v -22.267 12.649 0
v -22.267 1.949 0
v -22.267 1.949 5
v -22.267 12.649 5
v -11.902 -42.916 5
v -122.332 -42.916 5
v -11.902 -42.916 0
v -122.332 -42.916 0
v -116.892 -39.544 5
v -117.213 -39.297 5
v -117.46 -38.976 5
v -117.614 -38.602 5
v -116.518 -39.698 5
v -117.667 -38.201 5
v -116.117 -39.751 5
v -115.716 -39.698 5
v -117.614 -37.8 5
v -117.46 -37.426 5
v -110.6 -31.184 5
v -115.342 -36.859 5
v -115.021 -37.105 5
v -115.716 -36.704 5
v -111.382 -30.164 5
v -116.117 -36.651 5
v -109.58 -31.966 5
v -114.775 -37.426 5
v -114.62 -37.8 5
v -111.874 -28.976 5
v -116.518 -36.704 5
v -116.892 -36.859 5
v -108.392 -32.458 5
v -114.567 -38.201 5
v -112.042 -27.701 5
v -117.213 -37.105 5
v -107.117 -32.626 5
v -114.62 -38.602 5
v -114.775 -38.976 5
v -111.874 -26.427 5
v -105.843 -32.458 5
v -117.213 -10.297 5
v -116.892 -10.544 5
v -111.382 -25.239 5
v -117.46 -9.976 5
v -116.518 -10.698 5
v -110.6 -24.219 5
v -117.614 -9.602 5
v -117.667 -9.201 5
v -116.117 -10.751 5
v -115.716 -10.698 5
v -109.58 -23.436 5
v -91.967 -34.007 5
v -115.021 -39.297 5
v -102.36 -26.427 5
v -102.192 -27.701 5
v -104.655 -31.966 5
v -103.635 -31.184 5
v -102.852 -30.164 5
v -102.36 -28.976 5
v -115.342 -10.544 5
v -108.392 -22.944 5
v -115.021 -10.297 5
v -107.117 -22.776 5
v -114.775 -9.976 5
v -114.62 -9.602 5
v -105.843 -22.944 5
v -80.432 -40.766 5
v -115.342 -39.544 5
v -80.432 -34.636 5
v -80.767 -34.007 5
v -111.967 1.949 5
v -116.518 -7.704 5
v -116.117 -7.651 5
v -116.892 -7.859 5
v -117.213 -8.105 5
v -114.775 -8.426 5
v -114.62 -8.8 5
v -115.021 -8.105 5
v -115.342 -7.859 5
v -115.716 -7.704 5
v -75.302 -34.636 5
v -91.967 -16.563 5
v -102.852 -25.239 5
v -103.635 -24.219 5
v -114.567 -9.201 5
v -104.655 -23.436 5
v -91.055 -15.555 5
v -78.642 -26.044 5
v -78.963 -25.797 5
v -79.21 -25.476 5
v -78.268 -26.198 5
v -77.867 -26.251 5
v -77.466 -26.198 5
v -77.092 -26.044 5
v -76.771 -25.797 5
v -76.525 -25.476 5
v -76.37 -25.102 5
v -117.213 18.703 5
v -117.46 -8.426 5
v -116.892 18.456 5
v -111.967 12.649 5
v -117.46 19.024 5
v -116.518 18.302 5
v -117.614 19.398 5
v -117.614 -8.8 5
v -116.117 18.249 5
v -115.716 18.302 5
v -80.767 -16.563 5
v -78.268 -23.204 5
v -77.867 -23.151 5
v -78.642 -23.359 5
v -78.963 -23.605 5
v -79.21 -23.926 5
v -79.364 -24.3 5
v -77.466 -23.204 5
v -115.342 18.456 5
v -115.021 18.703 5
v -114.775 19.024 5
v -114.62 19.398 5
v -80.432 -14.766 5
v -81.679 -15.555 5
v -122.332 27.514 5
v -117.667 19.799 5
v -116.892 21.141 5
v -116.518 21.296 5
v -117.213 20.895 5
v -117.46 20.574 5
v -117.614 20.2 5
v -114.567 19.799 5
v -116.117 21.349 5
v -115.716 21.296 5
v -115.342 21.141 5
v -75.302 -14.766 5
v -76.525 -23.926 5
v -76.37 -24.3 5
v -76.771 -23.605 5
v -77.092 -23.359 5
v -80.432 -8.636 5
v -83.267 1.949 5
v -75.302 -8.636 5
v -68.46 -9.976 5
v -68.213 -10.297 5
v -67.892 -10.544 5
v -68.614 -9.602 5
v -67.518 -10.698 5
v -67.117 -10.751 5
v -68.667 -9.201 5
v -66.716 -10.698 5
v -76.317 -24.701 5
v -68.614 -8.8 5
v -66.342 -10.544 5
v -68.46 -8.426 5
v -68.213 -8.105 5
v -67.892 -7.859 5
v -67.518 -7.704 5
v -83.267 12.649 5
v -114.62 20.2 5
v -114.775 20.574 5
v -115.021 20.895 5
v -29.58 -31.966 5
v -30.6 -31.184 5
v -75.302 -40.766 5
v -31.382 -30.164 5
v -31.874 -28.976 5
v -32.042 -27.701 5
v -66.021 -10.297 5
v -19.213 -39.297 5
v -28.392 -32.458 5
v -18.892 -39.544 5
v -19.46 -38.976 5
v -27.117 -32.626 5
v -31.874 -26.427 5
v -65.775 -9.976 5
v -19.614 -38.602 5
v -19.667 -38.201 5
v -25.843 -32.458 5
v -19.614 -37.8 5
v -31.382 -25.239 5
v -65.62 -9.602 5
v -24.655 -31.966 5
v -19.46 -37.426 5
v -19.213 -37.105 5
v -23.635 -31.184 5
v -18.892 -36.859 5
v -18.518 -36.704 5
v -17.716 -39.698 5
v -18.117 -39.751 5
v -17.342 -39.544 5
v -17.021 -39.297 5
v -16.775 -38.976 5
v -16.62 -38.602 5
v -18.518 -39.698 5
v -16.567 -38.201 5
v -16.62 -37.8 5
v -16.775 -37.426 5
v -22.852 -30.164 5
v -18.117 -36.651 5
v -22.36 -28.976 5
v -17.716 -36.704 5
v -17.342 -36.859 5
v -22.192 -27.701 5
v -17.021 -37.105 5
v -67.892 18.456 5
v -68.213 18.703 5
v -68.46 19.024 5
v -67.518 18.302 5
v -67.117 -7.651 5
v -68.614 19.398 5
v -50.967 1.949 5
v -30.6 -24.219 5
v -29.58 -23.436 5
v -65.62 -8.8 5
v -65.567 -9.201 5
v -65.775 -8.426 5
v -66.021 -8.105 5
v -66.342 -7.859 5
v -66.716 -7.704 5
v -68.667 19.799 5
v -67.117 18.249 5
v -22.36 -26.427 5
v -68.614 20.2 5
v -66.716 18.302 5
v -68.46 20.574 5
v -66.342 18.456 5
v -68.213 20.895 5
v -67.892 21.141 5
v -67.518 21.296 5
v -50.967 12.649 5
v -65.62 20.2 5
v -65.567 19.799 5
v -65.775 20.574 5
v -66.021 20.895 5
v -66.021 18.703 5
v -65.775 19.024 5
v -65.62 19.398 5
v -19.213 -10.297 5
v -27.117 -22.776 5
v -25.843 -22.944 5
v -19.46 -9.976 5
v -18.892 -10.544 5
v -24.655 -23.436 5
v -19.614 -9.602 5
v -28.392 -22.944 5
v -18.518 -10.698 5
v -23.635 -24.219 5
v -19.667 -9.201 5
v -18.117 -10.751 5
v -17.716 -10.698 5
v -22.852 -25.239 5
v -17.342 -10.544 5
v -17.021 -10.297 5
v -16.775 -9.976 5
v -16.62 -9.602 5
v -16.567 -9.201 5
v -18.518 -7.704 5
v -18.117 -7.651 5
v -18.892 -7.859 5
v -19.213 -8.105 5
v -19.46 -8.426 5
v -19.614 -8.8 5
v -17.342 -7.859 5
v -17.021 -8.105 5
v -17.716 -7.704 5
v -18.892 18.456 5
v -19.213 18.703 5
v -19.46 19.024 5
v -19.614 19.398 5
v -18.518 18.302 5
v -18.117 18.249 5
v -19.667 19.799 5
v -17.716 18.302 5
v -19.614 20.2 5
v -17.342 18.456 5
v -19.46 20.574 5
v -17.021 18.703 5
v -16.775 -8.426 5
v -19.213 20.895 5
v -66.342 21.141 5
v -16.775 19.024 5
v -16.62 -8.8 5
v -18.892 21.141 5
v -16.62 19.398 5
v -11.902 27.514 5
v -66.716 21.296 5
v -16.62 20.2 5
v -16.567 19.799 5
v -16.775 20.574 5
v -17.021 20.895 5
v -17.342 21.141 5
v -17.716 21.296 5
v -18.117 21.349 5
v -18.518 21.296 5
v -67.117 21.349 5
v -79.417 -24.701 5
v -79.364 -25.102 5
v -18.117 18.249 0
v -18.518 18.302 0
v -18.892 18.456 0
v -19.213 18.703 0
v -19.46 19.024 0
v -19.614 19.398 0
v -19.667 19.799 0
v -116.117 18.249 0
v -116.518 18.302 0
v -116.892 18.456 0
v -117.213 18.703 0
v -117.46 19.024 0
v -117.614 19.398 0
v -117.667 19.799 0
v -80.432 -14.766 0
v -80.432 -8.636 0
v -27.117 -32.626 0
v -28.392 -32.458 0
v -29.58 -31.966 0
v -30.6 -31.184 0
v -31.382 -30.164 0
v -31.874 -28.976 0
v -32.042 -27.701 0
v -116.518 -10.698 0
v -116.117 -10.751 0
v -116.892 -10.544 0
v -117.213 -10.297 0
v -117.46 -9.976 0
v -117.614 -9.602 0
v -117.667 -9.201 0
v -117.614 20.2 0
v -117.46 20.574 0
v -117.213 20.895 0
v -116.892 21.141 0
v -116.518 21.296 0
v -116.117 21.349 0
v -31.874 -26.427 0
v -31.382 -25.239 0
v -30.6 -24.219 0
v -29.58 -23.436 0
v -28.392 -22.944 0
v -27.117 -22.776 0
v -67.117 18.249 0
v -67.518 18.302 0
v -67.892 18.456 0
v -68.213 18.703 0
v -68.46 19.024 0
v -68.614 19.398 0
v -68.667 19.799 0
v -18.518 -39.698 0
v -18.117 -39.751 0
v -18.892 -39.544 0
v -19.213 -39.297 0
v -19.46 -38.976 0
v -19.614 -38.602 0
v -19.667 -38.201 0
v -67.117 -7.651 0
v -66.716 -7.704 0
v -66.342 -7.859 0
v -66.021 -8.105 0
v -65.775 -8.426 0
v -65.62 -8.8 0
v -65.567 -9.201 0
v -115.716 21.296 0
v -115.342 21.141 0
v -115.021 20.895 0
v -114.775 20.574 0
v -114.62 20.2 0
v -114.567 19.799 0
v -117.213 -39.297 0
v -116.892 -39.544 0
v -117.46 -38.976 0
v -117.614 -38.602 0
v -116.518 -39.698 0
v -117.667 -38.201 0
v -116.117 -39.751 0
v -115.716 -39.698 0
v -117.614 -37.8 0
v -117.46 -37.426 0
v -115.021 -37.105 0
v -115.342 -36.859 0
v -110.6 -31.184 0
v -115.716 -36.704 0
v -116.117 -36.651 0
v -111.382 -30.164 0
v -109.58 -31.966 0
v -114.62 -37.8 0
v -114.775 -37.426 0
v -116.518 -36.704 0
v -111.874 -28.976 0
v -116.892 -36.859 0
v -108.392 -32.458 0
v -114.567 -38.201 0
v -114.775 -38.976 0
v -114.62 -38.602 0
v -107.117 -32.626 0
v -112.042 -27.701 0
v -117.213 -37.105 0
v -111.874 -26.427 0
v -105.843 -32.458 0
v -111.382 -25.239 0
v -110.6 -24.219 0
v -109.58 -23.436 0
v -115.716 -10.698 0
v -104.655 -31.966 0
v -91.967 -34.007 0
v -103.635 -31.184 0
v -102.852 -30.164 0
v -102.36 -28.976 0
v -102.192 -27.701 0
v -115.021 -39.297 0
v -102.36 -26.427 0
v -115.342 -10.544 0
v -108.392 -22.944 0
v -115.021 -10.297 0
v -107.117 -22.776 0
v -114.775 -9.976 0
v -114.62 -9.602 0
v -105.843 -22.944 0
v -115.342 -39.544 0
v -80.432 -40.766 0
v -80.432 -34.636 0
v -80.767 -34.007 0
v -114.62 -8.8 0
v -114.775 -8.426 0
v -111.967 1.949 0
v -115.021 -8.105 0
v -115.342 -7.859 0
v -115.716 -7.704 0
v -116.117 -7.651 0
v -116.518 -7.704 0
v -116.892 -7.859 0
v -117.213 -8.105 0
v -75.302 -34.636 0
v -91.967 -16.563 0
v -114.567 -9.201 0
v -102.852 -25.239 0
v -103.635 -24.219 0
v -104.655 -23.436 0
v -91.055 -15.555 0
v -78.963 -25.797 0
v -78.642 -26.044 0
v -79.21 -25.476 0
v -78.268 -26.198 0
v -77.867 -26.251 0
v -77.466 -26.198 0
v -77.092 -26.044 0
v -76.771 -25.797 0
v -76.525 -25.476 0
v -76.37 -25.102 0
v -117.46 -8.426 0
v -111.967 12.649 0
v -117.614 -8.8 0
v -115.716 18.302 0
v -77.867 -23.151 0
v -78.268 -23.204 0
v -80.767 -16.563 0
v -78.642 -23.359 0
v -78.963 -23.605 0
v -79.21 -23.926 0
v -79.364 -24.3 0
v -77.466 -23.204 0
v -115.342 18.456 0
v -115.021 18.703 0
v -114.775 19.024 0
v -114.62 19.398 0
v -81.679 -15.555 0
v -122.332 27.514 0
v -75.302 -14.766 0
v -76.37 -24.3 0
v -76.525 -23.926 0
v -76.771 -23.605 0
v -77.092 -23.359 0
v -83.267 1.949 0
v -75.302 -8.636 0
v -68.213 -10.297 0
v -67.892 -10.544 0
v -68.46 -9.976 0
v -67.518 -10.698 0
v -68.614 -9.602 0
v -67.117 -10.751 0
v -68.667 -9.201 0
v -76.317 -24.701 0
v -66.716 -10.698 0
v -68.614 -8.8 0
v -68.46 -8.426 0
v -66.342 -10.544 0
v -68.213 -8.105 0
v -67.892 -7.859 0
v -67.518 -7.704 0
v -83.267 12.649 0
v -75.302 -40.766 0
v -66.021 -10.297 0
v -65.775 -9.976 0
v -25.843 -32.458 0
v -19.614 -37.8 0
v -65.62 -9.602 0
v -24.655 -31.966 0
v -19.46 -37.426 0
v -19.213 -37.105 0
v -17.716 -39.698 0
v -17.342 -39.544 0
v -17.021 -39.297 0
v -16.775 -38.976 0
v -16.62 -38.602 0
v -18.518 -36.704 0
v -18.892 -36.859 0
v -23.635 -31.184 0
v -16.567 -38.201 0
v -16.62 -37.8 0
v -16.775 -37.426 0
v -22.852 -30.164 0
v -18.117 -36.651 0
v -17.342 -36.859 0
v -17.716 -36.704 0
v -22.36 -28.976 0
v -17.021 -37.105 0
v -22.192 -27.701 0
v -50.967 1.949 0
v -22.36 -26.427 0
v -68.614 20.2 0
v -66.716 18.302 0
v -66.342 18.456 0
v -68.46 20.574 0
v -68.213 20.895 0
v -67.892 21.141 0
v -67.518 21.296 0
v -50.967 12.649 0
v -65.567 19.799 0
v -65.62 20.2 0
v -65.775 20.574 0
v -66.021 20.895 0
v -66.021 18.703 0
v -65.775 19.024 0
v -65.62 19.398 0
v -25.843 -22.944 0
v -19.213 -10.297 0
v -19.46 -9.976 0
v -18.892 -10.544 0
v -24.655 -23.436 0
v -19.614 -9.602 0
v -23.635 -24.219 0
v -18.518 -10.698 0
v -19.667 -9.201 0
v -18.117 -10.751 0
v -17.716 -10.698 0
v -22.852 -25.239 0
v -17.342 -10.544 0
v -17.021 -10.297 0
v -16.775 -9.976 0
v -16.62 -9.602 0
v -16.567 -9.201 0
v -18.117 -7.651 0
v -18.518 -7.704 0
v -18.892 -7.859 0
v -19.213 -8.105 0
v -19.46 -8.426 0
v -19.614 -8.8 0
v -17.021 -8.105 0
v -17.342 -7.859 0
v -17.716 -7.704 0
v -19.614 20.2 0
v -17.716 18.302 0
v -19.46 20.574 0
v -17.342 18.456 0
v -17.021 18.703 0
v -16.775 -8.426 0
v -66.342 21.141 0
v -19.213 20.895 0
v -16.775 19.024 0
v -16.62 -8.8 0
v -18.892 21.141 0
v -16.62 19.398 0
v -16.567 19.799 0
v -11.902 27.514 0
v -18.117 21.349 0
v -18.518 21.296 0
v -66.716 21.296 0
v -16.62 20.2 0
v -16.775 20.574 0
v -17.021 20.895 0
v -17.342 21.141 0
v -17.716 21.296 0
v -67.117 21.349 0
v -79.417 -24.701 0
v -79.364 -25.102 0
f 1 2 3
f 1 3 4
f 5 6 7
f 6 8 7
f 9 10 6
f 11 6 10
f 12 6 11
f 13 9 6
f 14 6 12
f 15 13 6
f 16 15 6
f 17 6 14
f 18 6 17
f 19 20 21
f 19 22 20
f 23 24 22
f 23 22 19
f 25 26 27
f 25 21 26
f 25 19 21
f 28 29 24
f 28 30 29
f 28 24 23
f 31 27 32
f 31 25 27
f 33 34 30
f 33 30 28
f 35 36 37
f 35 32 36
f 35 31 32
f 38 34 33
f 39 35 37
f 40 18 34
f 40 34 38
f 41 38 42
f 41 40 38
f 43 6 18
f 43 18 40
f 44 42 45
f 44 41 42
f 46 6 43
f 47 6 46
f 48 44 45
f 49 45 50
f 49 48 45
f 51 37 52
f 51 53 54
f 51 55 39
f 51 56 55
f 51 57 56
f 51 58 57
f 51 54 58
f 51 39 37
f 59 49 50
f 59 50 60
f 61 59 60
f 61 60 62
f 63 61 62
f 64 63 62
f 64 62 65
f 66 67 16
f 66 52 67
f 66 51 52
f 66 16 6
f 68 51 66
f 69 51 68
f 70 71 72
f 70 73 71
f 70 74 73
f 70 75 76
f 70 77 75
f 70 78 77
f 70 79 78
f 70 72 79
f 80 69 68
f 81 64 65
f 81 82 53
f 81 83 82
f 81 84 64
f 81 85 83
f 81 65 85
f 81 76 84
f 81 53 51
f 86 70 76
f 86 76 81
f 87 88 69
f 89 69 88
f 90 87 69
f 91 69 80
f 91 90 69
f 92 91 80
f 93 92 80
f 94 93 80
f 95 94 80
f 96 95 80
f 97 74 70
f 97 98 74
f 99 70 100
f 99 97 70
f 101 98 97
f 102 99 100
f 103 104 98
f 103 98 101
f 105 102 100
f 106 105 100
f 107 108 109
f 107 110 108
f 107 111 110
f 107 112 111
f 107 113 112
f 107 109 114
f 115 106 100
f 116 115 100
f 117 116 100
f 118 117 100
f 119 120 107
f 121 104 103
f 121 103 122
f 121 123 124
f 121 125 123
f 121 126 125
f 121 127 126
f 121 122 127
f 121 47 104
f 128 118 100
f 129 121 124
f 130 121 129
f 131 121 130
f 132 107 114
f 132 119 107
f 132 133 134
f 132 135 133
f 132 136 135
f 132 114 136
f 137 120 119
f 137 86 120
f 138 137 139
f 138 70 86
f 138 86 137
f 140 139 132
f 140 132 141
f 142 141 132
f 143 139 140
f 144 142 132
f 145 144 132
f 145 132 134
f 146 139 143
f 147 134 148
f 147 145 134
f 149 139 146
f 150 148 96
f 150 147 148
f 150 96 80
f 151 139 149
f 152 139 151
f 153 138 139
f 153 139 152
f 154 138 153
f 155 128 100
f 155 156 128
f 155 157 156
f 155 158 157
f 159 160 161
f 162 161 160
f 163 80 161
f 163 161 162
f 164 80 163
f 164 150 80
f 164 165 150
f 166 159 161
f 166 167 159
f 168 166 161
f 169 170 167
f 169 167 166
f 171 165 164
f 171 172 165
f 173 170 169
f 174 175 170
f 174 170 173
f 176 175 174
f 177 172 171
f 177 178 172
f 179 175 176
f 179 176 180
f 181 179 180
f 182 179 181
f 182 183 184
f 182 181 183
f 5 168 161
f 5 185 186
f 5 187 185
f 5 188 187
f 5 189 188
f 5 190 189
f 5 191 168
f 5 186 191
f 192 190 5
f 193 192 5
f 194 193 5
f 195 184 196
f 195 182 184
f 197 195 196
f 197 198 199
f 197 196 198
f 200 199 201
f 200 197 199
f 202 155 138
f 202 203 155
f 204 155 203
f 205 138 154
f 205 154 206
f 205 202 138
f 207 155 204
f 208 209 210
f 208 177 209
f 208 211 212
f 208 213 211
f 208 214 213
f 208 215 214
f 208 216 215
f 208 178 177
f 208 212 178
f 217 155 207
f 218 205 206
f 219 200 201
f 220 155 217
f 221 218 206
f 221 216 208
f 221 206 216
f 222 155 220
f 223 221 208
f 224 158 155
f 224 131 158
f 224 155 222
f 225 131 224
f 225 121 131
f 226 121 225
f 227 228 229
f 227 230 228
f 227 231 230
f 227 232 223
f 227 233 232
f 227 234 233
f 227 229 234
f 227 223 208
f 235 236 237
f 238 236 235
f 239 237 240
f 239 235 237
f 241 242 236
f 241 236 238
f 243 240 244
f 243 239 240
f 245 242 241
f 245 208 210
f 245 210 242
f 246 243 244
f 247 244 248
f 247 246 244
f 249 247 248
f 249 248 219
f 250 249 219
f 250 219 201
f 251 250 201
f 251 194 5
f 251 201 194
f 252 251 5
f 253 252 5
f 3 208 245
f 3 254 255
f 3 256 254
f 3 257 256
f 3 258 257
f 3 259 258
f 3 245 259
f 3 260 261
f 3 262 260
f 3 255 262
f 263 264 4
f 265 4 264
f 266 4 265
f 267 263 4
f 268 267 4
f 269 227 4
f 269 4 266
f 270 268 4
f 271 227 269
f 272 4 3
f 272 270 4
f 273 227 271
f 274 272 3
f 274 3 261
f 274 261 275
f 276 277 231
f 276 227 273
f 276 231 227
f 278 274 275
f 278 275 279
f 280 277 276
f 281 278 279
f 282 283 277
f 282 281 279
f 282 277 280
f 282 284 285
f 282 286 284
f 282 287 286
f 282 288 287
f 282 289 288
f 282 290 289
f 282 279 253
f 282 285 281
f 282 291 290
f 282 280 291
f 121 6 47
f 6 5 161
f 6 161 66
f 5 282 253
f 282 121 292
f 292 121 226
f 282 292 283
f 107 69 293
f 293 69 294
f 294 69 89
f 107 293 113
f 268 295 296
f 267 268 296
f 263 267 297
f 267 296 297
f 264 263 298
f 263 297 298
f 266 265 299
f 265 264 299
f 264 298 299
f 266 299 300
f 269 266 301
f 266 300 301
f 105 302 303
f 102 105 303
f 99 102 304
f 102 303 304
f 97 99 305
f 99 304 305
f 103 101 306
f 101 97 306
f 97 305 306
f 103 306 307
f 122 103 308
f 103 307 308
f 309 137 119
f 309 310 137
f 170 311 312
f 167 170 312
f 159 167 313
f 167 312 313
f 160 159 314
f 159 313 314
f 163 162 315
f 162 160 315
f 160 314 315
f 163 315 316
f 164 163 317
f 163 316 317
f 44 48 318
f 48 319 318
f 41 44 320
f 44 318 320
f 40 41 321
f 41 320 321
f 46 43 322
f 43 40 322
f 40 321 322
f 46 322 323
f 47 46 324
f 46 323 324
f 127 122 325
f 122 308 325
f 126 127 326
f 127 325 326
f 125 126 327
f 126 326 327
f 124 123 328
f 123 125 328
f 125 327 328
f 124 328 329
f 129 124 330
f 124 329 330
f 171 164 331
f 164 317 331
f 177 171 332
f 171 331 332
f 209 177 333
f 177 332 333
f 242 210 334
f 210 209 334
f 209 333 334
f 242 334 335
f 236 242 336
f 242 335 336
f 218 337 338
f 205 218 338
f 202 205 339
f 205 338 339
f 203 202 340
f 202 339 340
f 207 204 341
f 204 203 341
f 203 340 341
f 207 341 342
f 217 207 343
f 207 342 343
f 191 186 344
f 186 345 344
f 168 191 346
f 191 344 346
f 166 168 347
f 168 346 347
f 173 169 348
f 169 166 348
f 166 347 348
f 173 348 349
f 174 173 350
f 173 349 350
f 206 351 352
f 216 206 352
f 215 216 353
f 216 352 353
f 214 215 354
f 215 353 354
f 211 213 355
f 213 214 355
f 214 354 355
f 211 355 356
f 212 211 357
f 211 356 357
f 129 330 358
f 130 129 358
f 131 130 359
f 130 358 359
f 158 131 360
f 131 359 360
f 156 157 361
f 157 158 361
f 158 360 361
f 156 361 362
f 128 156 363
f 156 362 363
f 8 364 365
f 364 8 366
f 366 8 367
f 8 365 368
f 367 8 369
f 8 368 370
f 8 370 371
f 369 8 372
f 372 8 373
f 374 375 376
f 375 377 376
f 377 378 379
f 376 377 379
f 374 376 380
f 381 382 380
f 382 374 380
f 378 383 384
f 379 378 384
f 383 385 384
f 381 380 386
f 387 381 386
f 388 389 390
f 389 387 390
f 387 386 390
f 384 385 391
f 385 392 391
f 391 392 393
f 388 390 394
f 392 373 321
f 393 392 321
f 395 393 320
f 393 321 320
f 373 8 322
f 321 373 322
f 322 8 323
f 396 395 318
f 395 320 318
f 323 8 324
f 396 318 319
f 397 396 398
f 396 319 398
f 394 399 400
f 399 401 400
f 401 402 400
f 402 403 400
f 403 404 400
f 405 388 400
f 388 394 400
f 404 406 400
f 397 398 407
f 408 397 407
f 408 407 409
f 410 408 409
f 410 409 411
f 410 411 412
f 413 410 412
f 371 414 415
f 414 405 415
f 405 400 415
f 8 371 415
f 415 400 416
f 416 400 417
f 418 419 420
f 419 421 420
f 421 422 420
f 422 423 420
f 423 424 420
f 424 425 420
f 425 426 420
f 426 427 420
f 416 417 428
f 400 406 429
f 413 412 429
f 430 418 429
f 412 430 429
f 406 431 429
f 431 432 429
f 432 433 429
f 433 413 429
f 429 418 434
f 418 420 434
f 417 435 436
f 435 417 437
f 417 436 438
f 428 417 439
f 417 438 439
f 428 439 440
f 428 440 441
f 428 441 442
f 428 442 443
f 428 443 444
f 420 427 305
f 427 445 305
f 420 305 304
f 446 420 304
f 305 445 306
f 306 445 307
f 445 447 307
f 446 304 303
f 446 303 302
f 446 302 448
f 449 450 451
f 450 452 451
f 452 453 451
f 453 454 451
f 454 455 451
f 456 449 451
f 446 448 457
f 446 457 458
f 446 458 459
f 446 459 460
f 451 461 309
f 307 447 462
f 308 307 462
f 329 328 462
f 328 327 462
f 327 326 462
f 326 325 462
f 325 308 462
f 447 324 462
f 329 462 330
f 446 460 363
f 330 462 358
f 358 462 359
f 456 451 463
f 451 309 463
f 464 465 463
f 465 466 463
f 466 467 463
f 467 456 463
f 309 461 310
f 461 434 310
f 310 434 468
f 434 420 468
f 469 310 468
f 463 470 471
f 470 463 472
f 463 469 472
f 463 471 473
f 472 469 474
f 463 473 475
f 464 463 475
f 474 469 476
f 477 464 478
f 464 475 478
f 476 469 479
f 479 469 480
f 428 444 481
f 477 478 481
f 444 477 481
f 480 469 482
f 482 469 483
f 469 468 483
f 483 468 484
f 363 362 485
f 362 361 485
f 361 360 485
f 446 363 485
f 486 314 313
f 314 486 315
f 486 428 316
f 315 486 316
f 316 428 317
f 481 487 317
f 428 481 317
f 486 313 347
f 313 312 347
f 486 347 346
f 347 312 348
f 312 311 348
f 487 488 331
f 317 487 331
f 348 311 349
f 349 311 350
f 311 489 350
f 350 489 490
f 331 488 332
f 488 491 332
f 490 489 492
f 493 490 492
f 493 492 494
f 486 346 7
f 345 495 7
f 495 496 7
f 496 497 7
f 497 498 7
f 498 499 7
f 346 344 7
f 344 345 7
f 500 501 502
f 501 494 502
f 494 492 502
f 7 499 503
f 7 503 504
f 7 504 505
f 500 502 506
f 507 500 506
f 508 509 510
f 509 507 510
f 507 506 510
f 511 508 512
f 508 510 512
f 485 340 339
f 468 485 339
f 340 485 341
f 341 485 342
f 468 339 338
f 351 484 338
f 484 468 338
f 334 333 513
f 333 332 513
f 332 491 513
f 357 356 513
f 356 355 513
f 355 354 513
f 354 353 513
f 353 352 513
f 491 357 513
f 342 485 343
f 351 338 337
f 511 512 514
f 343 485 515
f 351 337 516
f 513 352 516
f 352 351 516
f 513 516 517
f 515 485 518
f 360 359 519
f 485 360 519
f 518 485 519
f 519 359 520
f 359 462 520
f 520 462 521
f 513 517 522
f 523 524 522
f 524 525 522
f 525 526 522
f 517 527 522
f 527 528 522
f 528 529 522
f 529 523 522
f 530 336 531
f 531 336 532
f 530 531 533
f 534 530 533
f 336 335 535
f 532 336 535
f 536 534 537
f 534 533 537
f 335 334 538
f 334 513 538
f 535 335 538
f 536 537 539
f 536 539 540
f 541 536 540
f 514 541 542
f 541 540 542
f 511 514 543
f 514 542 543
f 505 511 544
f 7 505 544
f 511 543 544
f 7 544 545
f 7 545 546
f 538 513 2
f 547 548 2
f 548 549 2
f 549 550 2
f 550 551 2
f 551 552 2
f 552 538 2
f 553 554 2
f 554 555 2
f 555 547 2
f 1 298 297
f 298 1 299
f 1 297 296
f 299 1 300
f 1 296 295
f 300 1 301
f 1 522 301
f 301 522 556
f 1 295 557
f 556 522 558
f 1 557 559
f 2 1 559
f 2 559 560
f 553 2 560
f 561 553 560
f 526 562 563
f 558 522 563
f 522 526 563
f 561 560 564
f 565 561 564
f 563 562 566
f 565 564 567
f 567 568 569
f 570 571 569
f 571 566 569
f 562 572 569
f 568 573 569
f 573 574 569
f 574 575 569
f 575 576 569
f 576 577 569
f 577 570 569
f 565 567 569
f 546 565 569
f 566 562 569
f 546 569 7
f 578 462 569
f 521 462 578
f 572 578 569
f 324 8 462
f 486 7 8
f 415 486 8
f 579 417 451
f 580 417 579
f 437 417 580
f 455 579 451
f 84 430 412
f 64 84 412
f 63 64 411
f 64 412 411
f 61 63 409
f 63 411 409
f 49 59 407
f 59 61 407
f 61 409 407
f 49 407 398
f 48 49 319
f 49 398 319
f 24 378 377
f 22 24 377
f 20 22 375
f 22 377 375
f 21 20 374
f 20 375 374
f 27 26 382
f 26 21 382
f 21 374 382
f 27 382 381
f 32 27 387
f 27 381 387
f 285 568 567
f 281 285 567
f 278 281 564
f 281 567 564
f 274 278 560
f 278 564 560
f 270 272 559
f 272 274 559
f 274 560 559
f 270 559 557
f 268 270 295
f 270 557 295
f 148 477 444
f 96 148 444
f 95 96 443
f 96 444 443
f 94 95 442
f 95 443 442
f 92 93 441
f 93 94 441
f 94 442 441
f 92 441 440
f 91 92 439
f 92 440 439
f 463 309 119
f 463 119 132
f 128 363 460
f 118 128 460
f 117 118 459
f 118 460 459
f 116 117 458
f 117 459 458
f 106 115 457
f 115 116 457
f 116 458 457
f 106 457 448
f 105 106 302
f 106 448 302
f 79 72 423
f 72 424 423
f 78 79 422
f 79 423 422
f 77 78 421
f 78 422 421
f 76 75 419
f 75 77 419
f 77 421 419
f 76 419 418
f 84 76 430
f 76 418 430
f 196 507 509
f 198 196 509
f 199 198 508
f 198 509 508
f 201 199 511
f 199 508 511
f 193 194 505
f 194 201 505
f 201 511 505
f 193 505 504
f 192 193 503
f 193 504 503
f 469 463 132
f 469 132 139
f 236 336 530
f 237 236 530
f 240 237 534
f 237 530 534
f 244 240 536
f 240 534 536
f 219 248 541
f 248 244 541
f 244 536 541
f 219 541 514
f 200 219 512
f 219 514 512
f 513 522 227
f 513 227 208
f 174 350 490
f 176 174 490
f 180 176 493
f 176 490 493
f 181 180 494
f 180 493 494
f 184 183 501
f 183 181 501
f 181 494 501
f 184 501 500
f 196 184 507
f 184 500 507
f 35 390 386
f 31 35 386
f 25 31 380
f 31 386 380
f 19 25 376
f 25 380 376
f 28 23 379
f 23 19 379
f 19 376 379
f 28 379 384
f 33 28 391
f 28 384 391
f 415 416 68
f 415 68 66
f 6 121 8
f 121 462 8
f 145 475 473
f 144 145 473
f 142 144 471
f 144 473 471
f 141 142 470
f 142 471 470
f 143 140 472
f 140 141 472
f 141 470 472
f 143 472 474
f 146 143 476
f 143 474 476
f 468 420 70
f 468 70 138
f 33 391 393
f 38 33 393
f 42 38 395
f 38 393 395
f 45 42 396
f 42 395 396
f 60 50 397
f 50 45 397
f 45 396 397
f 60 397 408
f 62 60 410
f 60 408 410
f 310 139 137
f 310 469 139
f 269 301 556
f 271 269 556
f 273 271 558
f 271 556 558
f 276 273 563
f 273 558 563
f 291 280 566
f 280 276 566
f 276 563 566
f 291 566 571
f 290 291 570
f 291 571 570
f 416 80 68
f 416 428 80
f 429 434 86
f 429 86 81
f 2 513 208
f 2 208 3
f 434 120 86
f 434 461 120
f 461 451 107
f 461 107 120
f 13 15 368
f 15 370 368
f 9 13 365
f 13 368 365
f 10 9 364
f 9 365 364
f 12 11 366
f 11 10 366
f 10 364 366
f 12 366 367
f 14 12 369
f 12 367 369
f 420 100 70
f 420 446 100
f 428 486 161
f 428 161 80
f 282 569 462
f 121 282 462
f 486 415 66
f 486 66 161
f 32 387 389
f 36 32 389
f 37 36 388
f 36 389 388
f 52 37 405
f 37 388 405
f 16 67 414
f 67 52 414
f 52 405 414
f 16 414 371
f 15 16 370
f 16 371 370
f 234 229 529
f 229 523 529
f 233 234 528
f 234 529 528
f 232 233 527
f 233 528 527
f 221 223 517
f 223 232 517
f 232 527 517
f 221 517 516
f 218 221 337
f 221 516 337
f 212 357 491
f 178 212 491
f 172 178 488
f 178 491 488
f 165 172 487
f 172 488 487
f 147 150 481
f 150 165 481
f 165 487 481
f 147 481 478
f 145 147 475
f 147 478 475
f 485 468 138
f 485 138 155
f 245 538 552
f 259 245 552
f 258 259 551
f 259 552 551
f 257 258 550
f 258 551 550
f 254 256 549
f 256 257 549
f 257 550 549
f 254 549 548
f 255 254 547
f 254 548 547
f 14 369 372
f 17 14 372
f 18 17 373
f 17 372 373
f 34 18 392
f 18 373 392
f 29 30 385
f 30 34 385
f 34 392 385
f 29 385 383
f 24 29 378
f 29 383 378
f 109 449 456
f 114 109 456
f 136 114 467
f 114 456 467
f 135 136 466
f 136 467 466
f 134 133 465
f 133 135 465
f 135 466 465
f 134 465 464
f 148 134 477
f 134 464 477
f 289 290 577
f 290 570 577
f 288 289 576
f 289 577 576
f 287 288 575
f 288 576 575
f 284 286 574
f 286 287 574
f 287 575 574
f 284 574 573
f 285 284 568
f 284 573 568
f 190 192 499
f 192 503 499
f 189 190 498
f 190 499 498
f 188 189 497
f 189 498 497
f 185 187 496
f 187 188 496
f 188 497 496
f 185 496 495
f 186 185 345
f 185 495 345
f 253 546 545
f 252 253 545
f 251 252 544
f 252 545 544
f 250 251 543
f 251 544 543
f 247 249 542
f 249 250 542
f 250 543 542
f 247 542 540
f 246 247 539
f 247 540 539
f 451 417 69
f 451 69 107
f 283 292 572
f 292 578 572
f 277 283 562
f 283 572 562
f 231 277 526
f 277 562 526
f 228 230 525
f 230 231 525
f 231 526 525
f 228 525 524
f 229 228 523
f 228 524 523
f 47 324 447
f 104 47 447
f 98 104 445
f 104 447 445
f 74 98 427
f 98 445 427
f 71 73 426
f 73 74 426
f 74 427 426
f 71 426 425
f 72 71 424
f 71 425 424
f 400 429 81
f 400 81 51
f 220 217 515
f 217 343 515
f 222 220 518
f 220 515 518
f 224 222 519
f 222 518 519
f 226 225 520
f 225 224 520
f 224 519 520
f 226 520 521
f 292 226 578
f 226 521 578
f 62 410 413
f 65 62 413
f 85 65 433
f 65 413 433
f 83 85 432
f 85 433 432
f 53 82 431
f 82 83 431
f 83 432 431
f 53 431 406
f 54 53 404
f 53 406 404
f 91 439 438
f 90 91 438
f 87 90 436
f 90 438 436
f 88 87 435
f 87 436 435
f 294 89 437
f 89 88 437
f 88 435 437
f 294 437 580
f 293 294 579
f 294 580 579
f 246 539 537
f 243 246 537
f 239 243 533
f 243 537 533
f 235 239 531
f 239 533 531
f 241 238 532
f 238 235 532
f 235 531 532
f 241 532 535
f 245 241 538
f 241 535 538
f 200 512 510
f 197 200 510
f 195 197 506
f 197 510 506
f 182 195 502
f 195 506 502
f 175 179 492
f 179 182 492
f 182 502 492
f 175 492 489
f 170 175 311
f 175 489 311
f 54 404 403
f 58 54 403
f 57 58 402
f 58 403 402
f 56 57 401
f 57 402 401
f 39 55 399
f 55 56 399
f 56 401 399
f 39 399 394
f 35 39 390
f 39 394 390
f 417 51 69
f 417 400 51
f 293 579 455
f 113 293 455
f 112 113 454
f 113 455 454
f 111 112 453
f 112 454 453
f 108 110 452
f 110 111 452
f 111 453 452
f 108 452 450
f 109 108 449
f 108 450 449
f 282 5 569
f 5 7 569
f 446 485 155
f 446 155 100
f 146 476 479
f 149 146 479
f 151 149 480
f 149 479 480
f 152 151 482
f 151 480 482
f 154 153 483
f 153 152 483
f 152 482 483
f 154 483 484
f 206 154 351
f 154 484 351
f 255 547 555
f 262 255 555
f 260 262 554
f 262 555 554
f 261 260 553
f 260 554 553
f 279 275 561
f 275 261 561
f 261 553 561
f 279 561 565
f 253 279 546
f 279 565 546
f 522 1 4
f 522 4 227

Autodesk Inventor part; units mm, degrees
ref_plane "YZ Plane" through (0, 0, 0) normal (1, 0, 0) x (0, 1, 0)
ref_plane "XZ Plane" through (0, 0, 0) normal (0, 1, 0) x (-1, 0, 0)
ref_plane "XY Plane" through (0, 0, 0) normal (0, 0, 1) x (1, 0, 0)
sketch "Boceto1" plane through (0, 0, 0) normal (0, 0, 1) x (1, 0, 0)
  arc A0 (-116.1173, 21.3488) -> (-117.6673, 19.7988) centre (-116.1173, 19.7988) ccw
  arc A1 (-117.6673, 19.7988) -> (-116.1173, 18.2488) centre (-116.1173, 19.7988) ccw
  arc A2 (-116.1173, 18.2488) -> (-114.5673, 19.7988) centre (-116.1173, 19.7988) ccw
  arc A3 (-114.5673, 19.7988) -> (-116.1173, 21.3488) centre (-116.1173, 19.7988) ccw
  arc A4 (-67.1173, 21.3488) -> (-68.6673, 19.7988) centre (-67.1173, 19.7988) ccw
  arc A5 (-68.6673, 19.7988) -> (-67.1173, 18.2488) centre (-67.1173, 19.7988) ccw
  arc A6 (-67.1173, 18.2488) -> (-65.5673, 19.7988) centre (-67.1173, 19.7988) ccw
  arc A7 (-65.5673, 19.7988) -> (-67.1173, 21.3488) centre (-67.1173, 19.7988) ccw
  arc A8 (-18.1173, 21.3488) -> (-19.6673, 19.7988) centre (-18.1173, 19.7988) ccw
  arc A9 (-19.6673, 19.7988) -> (-18.1173, 18.2488) centre (-18.1173, 19.7988) ccw
  arc A10 (-18.1173, 18.2488) -> (-16.5673, 19.7988) centre (-18.1173, 19.7988) ccw
  arc A11 (-16.5673, 19.7988) -> (-18.1173, 21.3488) centre (-18.1173, 19.7988) ccw
  arc A12 (-18.1173, -7.6512) -> (-19.6673, -9.2012) centre (-18.1173, -9.2012) ccw
  arc A13 (-19.6673, -9.2012) -> (-18.1173, -10.7512) centre (-18.1173, -9.2012) ccw
  arc A14 (-18.1173, -10.7512) -> (-16.5673, -9.2012) centre (-18.1173, -9.2012) ccw
  arc A15 (-16.5673, -9.2012) -> (-18.1173, -7.6512) centre (-18.1173, -9.2012) ccw
  arc A16 (-67.1173, -7.6512) -> (-68.6673, -9.2012) centre (-67.1173, -9.2012) ccw
  arc A17 (-68.6673, -9.2012) -> (-67.1173, -10.7512) centre (-67.1173, -9.2012) ccw
  arc A18 (-67.1173, -10.7512) -> (-65.5673, -9.2012) centre (-67.1173, -9.2012) ccw
  arc A19 (-65.5673, -9.2012) -> (-67.1173, -7.6512) centre (-67.1173, -9.2012) ccw
  arc A20 (-116.1173, -7.6512) -> (-117.6673, -9.2012) centre (-116.1173, -9.2012) ccw
  arc A21 (-117.6673, -9.2012) -> (-116.1173, -10.7512) centre (-116.1173, -9.2012) ccw
  arc A22 (-116.1173, -10.7512) -> (-114.5673, -9.2012) centre (-116.1173, -9.2012) ccw
  arc A23 (-114.5673, -9.2012) -> (-116.1173, -7.6512) centre (-116.1173, -9.2012) ccw
  arc A24 (-116.1173, -36.6512) -> (-117.6673, -38.2012) centre (-116.1173, -38.2012) ccw
  arc A25 (-117.6673, -38.2012) -> (-116.1173, -39.7512) centre (-116.1173, -38.2012) ccw
  arc A26 (-116.1173, -39.7512) -> (-114.5673, -38.2012) centre (-116.1173, -38.2012) ccw
  arc A27 (-114.5673, -38.2012) -> (-116.1173, -36.6512) centre (-116.1173, -38.2012) ccw
  arc A28 (-18.1173, -36.6512) -> (-19.6673, -38.2012) centre (-18.1173, -38.2012) ccw
  arc A29 (-19.6673, -38.2012) -> (-18.1173, -39.7512) centre (-18.1173, -38.2012) ccw
  arc A30 (-18.1173, -39.7512) -> (-16.5673, -38.2012) centre (-18.1173, -38.2012) ccw
  arc A31 (-16.5673, -38.2012) -> (-18.1173, -36.6512) centre (-18.1173, -38.2012) ccw
  arc A32 (-107.1173, -22.7762) -> (-112.0423, -27.7012) centre (-107.1173, -27.7012) ccw
  arc A33 (-112.0423, -27.7012) -> (-107.1173, -32.6262) centre (-107.1173, -27.7012) ccw
  arc A34 (-107.1173, -32.6262) -> (-102.1923, -27.7012) centre (-107.1173, -27.7012) ccw
  arc A35 (-102.1923, -27.7012) -> (-107.1173, -22.7762) centre (-107.1173, -27.7012) ccw
  arc A36 (-27.1173, -22.7762) -> (-32.0423, -27.7012) centre (-27.1173, -27.7012) ccw
  arc A37 (-32.0423, -27.7012) -> (-27.1173, -32.6262) centre (-27.1173, -27.7012) ccw
  arc A38 (-27.1173, -32.6262) -> (-22.1923, -27.7012) centre (-27.1173, -27.7012) ccw
  arc A39 (-22.1923, -27.7012) -> (-27.1173, -22.7762) centre (-27.1173, -27.7012) ccw
  arc A40 (-77.8673, -23.1512) -> (-79.4173, -24.7012) centre (-77.8673, -24.7012) ccw
  arc A41 (-79.4173, -24.7012) -> (-77.8673, -26.2512) centre (-77.8673, -24.7012) ccw
  arc A42 (-77.8673, -26.2512) -> (-76.3173, -24.7012) centre (-77.8673, -24.7012) ccw
  arc A43 (-76.3173, -24.7012) -> (-77.8673, -23.1512) centre (-77.8673, -24.7012) ccw
  line L0 (-111.9673, 1.9488) -> (-83.2673, 1.9488)
  line L1 (-83.2673, 1.9488) -> (-83.2673, 12.6488)
  line L2 (-83.2673, 12.6488) -> (-111.9673, 12.6488)
  line L3 (-111.9673, 12.6488) -> (-111.9673, 1.9488)
  line L4 (-50.9673, 12.6488) -> (-50.9673, 1.9488)
  line L5 (-50.9673, 1.9488) -> (-22.2673, 1.9488)
  line L6 (-22.2673, 1.9488) -> (-22.2673, 12.6488)
  line L7 (-22.2673, 12.6488) -> (-50.9673, 12.6488)
  line L8 (-80.7673, -16.563) -> (-81.6794, -15.5552)
  line L9 (-81.6794, -15.5552) -> (-91.0552, -15.5552)
  line L10 (-91.0552, -15.5552) -> (-91.9673, -16.563)
  line L11 (-91.9673, -16.563) -> (-91.9673, -34.0068)
  line L12 (-91.9673, -34.0068) -> (-80.7673, -34.0068)
  line L13 (-80.7673, -34.0068) -> (-80.7673, -16.563)
  line L14 (-11.9023, 27.5138) -> (-122.3323, 27.5138)
  line L15 (-122.3323, 27.5138) -> (-122.3323, -42.9162)
  line L16 (-122.3323, -42.9162) -> (-11.9023, -42.9162)
  line L17 (-11.9023, -42.9162) -> (-11.9023, 27.5138)
  line L18 (-75.3023, -14.7662) -> (-75.3023, -8.6362)
  line L19 (-75.3023, -8.6362) -> (-80.4323, -8.6362)
  line L20 (-80.4323, -8.6362) -> (-80.4323, -14.7662)
  line L21 (-80.4323, -14.7662) -> (-75.3023, -14.7662)
  line L22 (-80.4323, -34.6362) -> (-80.4323, -40.7662)
  line L23 (-80.4323, -40.7662) -> (-75.3023, -40.7662)
  line L24 (-75.3023, -40.7662) -> (-75.3023, -34.6362)
  line L25 (-75.3023, -34.6362) -> (-80.4323, -34.6362)
  point P0 (0, 0)
extrude "Extrusión1" add sketch "Boceto1" along normal blind 5
properties part number "carro x lado motor pieza 4"
